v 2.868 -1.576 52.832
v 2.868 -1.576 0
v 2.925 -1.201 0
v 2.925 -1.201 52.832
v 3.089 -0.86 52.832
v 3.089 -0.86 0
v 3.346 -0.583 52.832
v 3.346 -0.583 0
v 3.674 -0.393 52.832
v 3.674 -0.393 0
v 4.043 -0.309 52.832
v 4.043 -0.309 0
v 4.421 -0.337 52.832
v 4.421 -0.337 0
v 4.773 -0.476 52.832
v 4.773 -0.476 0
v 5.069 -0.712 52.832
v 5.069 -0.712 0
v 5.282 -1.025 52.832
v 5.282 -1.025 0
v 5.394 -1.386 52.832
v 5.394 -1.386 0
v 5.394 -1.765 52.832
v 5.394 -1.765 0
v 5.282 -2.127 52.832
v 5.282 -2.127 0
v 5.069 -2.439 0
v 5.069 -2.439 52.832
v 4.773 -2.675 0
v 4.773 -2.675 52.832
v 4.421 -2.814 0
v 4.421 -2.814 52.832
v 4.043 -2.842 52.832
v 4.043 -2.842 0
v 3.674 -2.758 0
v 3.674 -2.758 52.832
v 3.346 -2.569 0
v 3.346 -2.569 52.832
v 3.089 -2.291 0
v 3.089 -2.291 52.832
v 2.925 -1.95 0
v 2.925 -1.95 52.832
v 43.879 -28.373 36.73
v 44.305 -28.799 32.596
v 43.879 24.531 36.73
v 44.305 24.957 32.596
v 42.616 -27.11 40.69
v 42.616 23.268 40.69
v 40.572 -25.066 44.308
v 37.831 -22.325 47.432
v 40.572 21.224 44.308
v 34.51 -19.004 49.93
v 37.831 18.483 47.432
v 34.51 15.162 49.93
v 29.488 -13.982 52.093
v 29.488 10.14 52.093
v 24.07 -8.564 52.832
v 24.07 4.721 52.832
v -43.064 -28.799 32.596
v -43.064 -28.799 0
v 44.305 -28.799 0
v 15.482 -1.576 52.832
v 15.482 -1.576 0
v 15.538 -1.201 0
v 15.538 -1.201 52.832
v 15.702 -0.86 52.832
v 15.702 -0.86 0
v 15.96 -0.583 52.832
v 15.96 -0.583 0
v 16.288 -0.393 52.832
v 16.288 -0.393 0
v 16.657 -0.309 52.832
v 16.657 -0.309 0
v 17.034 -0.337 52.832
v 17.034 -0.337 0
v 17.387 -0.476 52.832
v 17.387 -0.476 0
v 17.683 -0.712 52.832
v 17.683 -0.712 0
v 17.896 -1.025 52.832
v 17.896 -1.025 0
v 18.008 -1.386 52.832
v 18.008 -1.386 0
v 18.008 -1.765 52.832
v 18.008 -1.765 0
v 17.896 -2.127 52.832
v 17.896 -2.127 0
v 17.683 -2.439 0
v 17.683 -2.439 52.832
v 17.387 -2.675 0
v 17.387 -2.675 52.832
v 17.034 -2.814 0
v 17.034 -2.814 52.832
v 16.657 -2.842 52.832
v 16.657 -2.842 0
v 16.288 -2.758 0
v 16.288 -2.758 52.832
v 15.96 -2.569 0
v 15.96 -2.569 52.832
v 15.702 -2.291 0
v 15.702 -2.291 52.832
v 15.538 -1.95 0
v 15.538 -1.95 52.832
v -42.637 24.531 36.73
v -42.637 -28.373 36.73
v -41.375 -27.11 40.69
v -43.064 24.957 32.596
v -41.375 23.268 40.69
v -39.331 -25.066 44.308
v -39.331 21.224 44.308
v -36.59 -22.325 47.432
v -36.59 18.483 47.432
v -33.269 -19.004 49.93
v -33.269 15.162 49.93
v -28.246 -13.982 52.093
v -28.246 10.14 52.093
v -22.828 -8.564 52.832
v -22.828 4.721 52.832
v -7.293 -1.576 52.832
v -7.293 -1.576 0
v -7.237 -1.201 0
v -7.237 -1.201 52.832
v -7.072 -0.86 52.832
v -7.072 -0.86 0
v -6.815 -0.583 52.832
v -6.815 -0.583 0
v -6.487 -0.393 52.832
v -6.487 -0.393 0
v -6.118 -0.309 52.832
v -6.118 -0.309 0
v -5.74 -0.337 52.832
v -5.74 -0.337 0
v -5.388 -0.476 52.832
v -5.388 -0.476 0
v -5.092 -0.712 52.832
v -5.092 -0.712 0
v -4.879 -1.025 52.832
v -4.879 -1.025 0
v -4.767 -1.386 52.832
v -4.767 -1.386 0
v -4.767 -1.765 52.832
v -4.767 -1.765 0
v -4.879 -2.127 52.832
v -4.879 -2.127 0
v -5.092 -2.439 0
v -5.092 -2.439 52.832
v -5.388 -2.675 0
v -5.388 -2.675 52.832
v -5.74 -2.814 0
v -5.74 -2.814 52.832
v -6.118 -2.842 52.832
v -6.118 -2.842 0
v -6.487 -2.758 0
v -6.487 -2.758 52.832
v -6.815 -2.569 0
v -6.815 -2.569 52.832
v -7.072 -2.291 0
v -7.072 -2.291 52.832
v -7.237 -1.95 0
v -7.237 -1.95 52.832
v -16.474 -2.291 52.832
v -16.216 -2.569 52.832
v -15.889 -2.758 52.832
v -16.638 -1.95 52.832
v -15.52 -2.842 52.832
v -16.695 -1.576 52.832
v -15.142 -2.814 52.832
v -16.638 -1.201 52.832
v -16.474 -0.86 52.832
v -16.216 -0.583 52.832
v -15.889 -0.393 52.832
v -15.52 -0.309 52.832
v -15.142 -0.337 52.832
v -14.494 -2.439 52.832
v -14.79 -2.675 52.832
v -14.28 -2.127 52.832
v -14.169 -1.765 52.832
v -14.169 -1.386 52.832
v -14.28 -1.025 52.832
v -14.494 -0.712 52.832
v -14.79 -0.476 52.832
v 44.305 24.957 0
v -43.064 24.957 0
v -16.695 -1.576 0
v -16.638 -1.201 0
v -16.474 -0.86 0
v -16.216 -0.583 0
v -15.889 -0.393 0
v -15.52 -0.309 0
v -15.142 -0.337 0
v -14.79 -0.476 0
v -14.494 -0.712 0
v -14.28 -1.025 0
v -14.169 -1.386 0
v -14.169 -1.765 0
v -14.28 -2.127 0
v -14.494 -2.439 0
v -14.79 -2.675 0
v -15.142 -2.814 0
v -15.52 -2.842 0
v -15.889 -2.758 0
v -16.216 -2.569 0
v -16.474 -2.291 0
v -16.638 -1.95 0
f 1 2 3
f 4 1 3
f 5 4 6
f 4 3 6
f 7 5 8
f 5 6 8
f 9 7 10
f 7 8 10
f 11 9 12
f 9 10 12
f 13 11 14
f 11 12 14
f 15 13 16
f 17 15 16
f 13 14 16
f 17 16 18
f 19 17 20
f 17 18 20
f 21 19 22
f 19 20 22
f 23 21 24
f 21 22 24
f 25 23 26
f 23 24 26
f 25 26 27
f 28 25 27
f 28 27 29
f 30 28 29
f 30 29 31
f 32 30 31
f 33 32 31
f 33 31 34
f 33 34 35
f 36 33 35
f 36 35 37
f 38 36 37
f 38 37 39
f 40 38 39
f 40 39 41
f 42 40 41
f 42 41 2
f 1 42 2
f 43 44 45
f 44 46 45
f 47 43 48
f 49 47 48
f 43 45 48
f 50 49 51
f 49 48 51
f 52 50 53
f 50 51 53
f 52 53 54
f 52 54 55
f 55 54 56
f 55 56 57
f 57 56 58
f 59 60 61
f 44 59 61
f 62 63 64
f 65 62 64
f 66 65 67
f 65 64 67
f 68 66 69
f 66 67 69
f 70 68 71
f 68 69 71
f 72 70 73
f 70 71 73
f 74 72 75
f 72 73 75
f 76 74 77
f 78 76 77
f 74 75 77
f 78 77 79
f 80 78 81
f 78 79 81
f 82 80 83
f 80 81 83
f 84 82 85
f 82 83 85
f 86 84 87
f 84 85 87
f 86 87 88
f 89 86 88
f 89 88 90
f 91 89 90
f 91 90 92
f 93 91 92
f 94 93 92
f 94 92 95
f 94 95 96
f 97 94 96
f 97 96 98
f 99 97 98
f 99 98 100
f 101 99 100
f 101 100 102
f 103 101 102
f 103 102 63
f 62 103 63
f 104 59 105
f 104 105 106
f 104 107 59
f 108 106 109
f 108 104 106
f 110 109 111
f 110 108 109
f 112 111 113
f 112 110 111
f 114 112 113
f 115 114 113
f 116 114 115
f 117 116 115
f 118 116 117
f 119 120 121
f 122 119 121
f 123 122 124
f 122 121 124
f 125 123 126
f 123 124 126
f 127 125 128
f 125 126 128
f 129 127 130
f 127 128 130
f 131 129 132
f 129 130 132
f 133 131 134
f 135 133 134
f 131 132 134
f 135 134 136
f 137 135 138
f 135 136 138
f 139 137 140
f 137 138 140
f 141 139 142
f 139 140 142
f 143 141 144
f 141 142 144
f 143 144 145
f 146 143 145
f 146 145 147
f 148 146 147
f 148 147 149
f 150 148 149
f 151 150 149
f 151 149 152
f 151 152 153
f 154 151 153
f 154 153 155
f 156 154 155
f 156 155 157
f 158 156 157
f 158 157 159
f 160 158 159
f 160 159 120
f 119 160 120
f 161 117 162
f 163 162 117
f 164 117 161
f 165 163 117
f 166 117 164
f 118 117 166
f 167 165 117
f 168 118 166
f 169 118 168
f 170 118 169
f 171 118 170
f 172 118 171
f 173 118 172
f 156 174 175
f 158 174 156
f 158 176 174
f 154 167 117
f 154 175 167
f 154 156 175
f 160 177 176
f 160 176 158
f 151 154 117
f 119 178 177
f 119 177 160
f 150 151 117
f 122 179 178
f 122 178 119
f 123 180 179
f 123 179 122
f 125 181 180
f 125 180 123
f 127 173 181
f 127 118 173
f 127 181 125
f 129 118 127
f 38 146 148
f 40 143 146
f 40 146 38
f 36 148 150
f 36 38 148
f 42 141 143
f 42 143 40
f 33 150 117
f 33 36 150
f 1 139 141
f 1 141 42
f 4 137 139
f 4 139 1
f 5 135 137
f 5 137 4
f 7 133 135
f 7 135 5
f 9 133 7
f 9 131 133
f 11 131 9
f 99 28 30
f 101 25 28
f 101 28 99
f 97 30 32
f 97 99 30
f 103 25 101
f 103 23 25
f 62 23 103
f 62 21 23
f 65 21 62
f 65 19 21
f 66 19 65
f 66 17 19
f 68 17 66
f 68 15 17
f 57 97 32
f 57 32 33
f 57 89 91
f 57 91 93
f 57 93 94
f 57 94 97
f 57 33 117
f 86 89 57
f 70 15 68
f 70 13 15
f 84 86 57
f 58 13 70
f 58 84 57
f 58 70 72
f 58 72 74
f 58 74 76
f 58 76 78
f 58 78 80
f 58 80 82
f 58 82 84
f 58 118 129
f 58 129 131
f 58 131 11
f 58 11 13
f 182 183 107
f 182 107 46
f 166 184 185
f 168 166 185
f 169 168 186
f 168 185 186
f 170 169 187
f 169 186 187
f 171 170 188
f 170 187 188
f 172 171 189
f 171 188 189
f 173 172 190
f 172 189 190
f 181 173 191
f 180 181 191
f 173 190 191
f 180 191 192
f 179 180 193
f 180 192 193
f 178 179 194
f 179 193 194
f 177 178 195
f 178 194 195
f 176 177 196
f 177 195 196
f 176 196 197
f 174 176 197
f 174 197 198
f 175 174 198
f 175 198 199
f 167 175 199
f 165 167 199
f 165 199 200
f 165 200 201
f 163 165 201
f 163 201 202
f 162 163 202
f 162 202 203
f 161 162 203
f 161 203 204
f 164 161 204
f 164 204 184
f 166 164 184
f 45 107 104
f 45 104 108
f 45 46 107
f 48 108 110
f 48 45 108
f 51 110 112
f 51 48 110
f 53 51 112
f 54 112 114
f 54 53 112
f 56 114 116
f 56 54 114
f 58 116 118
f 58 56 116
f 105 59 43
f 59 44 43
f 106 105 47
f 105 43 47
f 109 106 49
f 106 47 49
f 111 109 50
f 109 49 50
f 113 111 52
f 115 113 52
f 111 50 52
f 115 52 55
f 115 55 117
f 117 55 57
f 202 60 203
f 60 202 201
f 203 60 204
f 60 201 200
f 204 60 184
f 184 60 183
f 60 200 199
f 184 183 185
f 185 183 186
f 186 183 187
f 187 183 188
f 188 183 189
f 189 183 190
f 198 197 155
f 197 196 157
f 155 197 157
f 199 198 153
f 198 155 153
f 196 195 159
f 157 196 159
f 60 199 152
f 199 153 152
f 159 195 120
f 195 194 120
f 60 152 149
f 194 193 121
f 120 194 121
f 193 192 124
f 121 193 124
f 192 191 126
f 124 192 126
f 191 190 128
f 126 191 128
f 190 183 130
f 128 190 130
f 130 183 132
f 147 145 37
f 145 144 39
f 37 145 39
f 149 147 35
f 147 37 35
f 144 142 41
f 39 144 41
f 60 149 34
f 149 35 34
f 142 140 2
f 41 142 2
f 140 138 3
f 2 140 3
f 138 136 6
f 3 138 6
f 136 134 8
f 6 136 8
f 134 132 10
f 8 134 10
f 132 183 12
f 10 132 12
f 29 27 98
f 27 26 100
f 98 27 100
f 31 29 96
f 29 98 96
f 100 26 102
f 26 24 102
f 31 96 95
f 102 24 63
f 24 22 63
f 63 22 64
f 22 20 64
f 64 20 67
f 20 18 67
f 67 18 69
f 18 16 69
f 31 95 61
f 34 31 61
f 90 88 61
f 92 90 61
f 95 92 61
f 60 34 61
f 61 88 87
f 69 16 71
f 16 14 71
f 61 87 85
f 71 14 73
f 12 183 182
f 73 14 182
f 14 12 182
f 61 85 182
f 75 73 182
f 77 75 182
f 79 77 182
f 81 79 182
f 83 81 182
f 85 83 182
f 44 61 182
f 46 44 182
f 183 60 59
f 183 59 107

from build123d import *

# Parameters (mm, degrees)
F0_W     = 87.369591
F0_H     = 53.756926
F1_DEPTH = 52.832
F2_R     = 20.235938
F4_D     = 2.54


with BuildPart() as f1:
    # F0 (on Top) → F1 (new body)
    with BuildSketch(Plane.XY):
        with Locations((0.62067, -1.921026)):
            Rectangle(F0_W, F0_H)
    extrude(amount=F1_DEPTH)

    # F2
    f2_edges = [f1.edges().sort_by_distance(p)[0] for p in [
        (0.620671, -28.799489, 52.832),
        (0.620671, 24.957437, 52.832),
        (44.305466, -1.921026, 52.832),
        (-43.064125, -1.921026, 52.832),
    ]]
    fillet(f2_edges, radius=F2_R)

    # F4 (through all)
    with Locations(Plane.XY.offset(52.832)):
        with Locations((-15.424626, -1.575627), (-6.023078, -1.575627), (4.138236, -1.575627), (16.751727, -1.575627)):
            Hole(F4_D / 2)


solid = f1.part
